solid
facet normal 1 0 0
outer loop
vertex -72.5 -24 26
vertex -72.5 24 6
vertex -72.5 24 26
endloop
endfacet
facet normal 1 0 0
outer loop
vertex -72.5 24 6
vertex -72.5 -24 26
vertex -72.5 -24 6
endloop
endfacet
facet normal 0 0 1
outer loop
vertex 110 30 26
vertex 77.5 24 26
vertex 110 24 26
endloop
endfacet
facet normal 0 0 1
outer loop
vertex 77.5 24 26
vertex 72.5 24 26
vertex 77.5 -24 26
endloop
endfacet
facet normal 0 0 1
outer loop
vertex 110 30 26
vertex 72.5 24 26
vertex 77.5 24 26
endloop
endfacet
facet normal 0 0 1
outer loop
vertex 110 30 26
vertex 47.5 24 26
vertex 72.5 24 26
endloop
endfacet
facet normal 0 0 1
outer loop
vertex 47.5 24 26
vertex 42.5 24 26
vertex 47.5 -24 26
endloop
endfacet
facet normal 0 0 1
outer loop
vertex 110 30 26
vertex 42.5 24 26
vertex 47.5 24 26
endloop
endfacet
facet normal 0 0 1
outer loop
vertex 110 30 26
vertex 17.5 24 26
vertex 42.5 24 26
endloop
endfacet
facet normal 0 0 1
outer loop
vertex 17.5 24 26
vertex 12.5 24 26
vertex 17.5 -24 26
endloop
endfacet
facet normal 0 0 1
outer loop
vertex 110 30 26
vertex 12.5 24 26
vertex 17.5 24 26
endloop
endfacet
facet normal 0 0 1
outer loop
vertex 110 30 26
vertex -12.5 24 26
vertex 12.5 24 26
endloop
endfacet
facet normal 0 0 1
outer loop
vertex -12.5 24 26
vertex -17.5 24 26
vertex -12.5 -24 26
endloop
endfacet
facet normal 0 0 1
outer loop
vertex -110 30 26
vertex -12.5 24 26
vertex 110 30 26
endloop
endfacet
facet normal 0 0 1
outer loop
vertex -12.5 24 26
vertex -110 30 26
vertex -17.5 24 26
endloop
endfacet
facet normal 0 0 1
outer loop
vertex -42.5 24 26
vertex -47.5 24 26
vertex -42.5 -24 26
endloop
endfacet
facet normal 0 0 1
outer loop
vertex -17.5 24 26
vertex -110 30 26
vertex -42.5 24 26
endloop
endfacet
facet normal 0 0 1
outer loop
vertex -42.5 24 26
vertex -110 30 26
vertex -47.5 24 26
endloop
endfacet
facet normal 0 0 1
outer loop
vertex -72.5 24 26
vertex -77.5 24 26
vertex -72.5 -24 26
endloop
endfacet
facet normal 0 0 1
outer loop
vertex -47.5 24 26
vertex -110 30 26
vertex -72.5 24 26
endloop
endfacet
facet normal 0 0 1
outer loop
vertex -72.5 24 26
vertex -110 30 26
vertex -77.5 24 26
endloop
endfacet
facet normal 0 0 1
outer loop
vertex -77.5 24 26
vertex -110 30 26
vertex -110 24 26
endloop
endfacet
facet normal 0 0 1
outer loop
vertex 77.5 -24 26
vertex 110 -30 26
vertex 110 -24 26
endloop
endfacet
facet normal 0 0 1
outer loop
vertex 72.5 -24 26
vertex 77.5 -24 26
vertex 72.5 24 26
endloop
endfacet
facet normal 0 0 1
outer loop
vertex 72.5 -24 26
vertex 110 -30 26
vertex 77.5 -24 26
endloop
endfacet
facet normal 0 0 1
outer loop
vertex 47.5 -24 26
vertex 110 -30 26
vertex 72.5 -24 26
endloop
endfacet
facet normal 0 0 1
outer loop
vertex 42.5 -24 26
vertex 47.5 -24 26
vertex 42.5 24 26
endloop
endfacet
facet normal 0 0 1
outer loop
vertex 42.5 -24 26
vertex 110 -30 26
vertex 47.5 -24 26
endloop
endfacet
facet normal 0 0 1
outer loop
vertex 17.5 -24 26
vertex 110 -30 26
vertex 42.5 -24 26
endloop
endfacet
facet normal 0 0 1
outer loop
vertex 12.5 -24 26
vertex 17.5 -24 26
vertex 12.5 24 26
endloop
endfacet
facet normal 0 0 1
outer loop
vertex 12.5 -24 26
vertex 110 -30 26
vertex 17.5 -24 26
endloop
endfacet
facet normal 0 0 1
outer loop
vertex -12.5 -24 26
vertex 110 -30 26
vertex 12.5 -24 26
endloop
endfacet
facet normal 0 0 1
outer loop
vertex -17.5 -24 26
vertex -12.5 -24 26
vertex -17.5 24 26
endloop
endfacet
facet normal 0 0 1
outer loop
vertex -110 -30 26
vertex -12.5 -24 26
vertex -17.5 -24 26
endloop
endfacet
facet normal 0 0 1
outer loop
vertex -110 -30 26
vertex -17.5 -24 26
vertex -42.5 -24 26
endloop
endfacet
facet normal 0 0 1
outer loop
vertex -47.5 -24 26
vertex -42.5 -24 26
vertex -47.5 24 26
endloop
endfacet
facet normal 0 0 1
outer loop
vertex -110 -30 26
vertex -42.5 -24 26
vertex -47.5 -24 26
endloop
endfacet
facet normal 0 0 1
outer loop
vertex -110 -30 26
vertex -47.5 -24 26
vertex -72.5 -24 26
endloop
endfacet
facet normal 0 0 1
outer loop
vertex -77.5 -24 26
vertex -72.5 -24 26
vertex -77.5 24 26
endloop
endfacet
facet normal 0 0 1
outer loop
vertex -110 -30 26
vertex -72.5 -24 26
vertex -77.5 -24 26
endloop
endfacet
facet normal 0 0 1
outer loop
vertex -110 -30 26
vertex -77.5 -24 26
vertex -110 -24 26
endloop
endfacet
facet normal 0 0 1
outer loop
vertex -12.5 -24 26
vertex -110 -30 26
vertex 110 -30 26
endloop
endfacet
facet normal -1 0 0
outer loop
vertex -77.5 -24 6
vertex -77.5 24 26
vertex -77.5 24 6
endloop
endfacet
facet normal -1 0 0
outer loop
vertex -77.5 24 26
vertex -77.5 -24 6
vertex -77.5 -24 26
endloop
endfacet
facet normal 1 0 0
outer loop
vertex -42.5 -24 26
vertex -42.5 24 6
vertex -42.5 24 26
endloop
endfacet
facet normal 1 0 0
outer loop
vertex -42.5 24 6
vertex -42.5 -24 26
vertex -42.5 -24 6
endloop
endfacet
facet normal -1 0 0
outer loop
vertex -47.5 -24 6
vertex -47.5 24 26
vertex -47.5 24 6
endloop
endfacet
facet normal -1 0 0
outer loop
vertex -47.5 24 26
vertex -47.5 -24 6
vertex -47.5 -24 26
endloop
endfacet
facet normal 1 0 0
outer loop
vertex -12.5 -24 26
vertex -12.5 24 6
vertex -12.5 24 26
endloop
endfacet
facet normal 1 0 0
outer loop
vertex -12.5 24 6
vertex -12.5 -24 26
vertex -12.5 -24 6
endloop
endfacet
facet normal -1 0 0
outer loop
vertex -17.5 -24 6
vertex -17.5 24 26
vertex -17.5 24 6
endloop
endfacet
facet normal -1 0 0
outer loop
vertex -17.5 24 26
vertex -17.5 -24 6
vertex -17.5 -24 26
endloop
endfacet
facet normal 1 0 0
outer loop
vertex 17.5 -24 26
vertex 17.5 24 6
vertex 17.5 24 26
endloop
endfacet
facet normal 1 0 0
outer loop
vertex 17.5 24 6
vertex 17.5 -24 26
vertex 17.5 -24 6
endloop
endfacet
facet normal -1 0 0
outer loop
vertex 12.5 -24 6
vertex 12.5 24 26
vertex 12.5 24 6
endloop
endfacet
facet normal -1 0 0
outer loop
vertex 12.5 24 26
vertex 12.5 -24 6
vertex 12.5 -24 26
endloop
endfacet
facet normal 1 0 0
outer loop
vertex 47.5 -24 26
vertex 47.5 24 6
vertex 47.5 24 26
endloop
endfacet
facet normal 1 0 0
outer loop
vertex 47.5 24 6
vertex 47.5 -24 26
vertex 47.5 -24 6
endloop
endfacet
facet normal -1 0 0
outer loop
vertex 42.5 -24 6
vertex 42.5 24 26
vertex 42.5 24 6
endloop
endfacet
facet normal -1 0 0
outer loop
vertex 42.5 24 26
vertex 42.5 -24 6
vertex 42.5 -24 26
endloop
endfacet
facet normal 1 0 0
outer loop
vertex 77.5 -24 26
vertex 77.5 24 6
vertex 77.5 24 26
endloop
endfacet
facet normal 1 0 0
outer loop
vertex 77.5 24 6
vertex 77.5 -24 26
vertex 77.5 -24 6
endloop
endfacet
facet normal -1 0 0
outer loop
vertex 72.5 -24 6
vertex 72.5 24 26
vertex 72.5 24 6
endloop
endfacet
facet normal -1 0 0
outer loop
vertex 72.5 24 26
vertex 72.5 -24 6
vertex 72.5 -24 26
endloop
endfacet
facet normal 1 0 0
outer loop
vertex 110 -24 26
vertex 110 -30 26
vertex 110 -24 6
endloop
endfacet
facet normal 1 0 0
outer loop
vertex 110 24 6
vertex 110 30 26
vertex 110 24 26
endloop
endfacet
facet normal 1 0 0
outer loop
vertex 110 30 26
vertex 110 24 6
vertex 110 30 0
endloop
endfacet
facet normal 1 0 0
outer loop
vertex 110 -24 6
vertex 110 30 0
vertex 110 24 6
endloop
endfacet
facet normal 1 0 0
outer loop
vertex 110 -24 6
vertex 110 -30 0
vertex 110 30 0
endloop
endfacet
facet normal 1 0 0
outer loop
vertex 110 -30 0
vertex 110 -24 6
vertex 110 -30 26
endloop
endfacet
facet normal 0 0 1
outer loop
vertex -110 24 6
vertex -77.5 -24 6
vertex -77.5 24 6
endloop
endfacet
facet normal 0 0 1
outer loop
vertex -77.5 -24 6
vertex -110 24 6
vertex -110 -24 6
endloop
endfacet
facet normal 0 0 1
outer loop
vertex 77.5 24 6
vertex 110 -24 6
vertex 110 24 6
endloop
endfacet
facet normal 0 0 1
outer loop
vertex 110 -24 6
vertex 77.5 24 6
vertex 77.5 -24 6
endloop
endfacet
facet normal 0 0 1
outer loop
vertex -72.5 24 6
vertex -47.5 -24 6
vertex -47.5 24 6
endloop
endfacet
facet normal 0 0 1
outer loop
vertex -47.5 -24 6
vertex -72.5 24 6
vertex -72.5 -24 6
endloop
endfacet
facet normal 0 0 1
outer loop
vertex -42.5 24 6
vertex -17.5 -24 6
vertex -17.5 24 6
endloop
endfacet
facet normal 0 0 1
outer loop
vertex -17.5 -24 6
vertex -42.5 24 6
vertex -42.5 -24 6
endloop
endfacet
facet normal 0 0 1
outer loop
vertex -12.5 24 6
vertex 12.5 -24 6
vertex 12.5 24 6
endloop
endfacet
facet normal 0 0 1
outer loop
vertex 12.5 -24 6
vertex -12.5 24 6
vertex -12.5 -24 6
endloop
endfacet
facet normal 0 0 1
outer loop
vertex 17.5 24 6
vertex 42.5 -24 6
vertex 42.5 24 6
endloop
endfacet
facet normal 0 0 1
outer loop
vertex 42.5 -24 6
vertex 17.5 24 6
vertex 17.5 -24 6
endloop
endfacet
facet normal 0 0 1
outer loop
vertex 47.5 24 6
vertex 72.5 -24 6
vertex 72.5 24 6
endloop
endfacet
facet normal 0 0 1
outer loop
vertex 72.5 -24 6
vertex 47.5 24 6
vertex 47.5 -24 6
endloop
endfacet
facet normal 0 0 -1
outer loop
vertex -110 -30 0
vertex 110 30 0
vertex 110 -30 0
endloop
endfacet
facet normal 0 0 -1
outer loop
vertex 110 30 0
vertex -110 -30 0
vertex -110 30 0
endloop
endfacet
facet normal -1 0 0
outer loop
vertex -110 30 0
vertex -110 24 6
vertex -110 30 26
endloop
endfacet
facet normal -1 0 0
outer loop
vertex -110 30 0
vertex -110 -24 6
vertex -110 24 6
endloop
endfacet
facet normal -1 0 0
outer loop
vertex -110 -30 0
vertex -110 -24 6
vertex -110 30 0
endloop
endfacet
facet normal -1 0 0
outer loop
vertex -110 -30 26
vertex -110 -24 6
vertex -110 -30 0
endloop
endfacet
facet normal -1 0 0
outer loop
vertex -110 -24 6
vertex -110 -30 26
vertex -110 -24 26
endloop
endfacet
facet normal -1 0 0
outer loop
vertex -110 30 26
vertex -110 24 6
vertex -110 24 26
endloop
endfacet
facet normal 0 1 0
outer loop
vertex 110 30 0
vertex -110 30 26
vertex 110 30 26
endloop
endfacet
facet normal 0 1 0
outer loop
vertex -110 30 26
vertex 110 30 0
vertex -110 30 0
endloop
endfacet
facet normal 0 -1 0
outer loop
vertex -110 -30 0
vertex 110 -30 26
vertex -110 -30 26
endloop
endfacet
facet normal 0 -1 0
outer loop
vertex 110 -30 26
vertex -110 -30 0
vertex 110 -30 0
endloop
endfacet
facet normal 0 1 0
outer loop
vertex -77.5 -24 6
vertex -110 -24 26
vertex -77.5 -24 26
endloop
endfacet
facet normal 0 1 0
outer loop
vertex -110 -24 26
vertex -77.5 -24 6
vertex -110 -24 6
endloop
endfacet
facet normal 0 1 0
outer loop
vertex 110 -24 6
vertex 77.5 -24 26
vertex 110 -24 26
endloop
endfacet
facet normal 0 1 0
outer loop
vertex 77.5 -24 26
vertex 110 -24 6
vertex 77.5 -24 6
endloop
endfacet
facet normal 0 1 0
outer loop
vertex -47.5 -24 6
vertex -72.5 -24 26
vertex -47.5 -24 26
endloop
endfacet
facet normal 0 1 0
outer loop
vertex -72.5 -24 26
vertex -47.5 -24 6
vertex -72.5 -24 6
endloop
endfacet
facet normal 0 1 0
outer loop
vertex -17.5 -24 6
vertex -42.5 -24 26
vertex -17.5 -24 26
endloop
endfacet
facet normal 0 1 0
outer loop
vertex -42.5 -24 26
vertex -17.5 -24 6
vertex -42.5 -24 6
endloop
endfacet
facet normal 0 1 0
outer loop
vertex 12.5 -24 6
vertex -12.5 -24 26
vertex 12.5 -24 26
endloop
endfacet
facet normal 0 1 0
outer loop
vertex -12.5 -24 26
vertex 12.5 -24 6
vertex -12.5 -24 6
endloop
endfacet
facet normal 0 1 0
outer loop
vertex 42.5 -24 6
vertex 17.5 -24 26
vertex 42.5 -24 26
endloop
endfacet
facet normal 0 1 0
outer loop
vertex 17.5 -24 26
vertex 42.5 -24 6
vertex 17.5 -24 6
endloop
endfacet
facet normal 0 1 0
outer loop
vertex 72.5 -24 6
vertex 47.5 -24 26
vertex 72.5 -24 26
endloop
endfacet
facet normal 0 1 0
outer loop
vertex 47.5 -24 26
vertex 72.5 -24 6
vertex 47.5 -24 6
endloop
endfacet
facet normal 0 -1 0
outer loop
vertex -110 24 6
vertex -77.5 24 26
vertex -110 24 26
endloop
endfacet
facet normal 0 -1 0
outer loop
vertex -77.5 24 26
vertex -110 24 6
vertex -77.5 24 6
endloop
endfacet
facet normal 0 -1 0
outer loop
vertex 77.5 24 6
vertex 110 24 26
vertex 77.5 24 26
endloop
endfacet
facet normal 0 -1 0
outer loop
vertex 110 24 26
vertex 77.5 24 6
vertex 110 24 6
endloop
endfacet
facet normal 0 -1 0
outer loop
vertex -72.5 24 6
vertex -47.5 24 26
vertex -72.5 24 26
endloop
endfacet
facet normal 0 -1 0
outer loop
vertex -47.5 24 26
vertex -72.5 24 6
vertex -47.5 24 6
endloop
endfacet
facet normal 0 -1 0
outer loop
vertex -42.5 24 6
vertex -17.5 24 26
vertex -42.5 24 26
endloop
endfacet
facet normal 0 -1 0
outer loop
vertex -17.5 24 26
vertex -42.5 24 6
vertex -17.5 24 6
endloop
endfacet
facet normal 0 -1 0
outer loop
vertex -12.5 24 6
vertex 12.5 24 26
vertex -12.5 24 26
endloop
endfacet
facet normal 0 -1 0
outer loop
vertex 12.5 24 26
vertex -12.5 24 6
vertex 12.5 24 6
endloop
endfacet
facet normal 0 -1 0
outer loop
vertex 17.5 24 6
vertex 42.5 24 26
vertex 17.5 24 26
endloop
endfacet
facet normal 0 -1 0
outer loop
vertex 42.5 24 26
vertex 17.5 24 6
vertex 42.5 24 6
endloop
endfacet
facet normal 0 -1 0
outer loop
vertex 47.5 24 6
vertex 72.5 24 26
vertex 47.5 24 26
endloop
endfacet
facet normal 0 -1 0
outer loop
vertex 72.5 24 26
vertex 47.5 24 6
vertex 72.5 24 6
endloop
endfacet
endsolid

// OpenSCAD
$fn = 32;

// ----------------------------------------------------------------------
// Rib frame 220 x 60 x 26
// 6 ribs at 30 mm pitch
// ----------------------------------------------------------------------

// --- parameters (mm) ---
frame = [220, 60, 6];  // base plate size (x, y, z)
rail_w = 6;            // side rail width
ribs = 6;              // number of ribs
rib_t = 5;             // rib thickness
rib_h = 20;            // rib height above the base plate
pitch = 30;            // pitch between rib centres

// --- derived feature positions (mm) ---
span = (ribs - 1) * pitch;          // = 150   distance between the outer ribs
origin_x = -span / 2;               // = -75   X of the first rib
rib_len = frame[1] - 2 * rail_w + 2;  // = 50   rib length, 1 mm into each rail
feature_centers = [
  [origin_x + 0 * pitch, 0],
  [origin_x + 1 * pitch, 0],
  [origin_x + 2 * pitch, 0],
  [origin_x + 3 * pitch, 0],
  [origin_x + 4 * pitch, 0],
  [origin_x + 5 * pitch, 0]
];   // rib centre line, drives the rib loop

// base plate, two side rails, then the ribs read straight off feature_centers
union() {
  translate([-frame[0] / 2, -frame[1] / 2, 0]) cube(frame);
  translate([-frame[0] / 2, -frame[1] / 2, 0]) cube([frame[0], rail_w, frame[2] + rib_h]);
  translate([-frame[0] / 2, frame[1] / 2 - rail_w, 0]) cube([frame[0], rail_w, frame[2] + rib_h]);
  for (centre = feature_centers)
    translate([centre[0] - rib_t / 2, centre[1] - rib_len / 2, frame[2] - 1])
      cube([rib_t, rib_len, rib_h + 1]);
}
